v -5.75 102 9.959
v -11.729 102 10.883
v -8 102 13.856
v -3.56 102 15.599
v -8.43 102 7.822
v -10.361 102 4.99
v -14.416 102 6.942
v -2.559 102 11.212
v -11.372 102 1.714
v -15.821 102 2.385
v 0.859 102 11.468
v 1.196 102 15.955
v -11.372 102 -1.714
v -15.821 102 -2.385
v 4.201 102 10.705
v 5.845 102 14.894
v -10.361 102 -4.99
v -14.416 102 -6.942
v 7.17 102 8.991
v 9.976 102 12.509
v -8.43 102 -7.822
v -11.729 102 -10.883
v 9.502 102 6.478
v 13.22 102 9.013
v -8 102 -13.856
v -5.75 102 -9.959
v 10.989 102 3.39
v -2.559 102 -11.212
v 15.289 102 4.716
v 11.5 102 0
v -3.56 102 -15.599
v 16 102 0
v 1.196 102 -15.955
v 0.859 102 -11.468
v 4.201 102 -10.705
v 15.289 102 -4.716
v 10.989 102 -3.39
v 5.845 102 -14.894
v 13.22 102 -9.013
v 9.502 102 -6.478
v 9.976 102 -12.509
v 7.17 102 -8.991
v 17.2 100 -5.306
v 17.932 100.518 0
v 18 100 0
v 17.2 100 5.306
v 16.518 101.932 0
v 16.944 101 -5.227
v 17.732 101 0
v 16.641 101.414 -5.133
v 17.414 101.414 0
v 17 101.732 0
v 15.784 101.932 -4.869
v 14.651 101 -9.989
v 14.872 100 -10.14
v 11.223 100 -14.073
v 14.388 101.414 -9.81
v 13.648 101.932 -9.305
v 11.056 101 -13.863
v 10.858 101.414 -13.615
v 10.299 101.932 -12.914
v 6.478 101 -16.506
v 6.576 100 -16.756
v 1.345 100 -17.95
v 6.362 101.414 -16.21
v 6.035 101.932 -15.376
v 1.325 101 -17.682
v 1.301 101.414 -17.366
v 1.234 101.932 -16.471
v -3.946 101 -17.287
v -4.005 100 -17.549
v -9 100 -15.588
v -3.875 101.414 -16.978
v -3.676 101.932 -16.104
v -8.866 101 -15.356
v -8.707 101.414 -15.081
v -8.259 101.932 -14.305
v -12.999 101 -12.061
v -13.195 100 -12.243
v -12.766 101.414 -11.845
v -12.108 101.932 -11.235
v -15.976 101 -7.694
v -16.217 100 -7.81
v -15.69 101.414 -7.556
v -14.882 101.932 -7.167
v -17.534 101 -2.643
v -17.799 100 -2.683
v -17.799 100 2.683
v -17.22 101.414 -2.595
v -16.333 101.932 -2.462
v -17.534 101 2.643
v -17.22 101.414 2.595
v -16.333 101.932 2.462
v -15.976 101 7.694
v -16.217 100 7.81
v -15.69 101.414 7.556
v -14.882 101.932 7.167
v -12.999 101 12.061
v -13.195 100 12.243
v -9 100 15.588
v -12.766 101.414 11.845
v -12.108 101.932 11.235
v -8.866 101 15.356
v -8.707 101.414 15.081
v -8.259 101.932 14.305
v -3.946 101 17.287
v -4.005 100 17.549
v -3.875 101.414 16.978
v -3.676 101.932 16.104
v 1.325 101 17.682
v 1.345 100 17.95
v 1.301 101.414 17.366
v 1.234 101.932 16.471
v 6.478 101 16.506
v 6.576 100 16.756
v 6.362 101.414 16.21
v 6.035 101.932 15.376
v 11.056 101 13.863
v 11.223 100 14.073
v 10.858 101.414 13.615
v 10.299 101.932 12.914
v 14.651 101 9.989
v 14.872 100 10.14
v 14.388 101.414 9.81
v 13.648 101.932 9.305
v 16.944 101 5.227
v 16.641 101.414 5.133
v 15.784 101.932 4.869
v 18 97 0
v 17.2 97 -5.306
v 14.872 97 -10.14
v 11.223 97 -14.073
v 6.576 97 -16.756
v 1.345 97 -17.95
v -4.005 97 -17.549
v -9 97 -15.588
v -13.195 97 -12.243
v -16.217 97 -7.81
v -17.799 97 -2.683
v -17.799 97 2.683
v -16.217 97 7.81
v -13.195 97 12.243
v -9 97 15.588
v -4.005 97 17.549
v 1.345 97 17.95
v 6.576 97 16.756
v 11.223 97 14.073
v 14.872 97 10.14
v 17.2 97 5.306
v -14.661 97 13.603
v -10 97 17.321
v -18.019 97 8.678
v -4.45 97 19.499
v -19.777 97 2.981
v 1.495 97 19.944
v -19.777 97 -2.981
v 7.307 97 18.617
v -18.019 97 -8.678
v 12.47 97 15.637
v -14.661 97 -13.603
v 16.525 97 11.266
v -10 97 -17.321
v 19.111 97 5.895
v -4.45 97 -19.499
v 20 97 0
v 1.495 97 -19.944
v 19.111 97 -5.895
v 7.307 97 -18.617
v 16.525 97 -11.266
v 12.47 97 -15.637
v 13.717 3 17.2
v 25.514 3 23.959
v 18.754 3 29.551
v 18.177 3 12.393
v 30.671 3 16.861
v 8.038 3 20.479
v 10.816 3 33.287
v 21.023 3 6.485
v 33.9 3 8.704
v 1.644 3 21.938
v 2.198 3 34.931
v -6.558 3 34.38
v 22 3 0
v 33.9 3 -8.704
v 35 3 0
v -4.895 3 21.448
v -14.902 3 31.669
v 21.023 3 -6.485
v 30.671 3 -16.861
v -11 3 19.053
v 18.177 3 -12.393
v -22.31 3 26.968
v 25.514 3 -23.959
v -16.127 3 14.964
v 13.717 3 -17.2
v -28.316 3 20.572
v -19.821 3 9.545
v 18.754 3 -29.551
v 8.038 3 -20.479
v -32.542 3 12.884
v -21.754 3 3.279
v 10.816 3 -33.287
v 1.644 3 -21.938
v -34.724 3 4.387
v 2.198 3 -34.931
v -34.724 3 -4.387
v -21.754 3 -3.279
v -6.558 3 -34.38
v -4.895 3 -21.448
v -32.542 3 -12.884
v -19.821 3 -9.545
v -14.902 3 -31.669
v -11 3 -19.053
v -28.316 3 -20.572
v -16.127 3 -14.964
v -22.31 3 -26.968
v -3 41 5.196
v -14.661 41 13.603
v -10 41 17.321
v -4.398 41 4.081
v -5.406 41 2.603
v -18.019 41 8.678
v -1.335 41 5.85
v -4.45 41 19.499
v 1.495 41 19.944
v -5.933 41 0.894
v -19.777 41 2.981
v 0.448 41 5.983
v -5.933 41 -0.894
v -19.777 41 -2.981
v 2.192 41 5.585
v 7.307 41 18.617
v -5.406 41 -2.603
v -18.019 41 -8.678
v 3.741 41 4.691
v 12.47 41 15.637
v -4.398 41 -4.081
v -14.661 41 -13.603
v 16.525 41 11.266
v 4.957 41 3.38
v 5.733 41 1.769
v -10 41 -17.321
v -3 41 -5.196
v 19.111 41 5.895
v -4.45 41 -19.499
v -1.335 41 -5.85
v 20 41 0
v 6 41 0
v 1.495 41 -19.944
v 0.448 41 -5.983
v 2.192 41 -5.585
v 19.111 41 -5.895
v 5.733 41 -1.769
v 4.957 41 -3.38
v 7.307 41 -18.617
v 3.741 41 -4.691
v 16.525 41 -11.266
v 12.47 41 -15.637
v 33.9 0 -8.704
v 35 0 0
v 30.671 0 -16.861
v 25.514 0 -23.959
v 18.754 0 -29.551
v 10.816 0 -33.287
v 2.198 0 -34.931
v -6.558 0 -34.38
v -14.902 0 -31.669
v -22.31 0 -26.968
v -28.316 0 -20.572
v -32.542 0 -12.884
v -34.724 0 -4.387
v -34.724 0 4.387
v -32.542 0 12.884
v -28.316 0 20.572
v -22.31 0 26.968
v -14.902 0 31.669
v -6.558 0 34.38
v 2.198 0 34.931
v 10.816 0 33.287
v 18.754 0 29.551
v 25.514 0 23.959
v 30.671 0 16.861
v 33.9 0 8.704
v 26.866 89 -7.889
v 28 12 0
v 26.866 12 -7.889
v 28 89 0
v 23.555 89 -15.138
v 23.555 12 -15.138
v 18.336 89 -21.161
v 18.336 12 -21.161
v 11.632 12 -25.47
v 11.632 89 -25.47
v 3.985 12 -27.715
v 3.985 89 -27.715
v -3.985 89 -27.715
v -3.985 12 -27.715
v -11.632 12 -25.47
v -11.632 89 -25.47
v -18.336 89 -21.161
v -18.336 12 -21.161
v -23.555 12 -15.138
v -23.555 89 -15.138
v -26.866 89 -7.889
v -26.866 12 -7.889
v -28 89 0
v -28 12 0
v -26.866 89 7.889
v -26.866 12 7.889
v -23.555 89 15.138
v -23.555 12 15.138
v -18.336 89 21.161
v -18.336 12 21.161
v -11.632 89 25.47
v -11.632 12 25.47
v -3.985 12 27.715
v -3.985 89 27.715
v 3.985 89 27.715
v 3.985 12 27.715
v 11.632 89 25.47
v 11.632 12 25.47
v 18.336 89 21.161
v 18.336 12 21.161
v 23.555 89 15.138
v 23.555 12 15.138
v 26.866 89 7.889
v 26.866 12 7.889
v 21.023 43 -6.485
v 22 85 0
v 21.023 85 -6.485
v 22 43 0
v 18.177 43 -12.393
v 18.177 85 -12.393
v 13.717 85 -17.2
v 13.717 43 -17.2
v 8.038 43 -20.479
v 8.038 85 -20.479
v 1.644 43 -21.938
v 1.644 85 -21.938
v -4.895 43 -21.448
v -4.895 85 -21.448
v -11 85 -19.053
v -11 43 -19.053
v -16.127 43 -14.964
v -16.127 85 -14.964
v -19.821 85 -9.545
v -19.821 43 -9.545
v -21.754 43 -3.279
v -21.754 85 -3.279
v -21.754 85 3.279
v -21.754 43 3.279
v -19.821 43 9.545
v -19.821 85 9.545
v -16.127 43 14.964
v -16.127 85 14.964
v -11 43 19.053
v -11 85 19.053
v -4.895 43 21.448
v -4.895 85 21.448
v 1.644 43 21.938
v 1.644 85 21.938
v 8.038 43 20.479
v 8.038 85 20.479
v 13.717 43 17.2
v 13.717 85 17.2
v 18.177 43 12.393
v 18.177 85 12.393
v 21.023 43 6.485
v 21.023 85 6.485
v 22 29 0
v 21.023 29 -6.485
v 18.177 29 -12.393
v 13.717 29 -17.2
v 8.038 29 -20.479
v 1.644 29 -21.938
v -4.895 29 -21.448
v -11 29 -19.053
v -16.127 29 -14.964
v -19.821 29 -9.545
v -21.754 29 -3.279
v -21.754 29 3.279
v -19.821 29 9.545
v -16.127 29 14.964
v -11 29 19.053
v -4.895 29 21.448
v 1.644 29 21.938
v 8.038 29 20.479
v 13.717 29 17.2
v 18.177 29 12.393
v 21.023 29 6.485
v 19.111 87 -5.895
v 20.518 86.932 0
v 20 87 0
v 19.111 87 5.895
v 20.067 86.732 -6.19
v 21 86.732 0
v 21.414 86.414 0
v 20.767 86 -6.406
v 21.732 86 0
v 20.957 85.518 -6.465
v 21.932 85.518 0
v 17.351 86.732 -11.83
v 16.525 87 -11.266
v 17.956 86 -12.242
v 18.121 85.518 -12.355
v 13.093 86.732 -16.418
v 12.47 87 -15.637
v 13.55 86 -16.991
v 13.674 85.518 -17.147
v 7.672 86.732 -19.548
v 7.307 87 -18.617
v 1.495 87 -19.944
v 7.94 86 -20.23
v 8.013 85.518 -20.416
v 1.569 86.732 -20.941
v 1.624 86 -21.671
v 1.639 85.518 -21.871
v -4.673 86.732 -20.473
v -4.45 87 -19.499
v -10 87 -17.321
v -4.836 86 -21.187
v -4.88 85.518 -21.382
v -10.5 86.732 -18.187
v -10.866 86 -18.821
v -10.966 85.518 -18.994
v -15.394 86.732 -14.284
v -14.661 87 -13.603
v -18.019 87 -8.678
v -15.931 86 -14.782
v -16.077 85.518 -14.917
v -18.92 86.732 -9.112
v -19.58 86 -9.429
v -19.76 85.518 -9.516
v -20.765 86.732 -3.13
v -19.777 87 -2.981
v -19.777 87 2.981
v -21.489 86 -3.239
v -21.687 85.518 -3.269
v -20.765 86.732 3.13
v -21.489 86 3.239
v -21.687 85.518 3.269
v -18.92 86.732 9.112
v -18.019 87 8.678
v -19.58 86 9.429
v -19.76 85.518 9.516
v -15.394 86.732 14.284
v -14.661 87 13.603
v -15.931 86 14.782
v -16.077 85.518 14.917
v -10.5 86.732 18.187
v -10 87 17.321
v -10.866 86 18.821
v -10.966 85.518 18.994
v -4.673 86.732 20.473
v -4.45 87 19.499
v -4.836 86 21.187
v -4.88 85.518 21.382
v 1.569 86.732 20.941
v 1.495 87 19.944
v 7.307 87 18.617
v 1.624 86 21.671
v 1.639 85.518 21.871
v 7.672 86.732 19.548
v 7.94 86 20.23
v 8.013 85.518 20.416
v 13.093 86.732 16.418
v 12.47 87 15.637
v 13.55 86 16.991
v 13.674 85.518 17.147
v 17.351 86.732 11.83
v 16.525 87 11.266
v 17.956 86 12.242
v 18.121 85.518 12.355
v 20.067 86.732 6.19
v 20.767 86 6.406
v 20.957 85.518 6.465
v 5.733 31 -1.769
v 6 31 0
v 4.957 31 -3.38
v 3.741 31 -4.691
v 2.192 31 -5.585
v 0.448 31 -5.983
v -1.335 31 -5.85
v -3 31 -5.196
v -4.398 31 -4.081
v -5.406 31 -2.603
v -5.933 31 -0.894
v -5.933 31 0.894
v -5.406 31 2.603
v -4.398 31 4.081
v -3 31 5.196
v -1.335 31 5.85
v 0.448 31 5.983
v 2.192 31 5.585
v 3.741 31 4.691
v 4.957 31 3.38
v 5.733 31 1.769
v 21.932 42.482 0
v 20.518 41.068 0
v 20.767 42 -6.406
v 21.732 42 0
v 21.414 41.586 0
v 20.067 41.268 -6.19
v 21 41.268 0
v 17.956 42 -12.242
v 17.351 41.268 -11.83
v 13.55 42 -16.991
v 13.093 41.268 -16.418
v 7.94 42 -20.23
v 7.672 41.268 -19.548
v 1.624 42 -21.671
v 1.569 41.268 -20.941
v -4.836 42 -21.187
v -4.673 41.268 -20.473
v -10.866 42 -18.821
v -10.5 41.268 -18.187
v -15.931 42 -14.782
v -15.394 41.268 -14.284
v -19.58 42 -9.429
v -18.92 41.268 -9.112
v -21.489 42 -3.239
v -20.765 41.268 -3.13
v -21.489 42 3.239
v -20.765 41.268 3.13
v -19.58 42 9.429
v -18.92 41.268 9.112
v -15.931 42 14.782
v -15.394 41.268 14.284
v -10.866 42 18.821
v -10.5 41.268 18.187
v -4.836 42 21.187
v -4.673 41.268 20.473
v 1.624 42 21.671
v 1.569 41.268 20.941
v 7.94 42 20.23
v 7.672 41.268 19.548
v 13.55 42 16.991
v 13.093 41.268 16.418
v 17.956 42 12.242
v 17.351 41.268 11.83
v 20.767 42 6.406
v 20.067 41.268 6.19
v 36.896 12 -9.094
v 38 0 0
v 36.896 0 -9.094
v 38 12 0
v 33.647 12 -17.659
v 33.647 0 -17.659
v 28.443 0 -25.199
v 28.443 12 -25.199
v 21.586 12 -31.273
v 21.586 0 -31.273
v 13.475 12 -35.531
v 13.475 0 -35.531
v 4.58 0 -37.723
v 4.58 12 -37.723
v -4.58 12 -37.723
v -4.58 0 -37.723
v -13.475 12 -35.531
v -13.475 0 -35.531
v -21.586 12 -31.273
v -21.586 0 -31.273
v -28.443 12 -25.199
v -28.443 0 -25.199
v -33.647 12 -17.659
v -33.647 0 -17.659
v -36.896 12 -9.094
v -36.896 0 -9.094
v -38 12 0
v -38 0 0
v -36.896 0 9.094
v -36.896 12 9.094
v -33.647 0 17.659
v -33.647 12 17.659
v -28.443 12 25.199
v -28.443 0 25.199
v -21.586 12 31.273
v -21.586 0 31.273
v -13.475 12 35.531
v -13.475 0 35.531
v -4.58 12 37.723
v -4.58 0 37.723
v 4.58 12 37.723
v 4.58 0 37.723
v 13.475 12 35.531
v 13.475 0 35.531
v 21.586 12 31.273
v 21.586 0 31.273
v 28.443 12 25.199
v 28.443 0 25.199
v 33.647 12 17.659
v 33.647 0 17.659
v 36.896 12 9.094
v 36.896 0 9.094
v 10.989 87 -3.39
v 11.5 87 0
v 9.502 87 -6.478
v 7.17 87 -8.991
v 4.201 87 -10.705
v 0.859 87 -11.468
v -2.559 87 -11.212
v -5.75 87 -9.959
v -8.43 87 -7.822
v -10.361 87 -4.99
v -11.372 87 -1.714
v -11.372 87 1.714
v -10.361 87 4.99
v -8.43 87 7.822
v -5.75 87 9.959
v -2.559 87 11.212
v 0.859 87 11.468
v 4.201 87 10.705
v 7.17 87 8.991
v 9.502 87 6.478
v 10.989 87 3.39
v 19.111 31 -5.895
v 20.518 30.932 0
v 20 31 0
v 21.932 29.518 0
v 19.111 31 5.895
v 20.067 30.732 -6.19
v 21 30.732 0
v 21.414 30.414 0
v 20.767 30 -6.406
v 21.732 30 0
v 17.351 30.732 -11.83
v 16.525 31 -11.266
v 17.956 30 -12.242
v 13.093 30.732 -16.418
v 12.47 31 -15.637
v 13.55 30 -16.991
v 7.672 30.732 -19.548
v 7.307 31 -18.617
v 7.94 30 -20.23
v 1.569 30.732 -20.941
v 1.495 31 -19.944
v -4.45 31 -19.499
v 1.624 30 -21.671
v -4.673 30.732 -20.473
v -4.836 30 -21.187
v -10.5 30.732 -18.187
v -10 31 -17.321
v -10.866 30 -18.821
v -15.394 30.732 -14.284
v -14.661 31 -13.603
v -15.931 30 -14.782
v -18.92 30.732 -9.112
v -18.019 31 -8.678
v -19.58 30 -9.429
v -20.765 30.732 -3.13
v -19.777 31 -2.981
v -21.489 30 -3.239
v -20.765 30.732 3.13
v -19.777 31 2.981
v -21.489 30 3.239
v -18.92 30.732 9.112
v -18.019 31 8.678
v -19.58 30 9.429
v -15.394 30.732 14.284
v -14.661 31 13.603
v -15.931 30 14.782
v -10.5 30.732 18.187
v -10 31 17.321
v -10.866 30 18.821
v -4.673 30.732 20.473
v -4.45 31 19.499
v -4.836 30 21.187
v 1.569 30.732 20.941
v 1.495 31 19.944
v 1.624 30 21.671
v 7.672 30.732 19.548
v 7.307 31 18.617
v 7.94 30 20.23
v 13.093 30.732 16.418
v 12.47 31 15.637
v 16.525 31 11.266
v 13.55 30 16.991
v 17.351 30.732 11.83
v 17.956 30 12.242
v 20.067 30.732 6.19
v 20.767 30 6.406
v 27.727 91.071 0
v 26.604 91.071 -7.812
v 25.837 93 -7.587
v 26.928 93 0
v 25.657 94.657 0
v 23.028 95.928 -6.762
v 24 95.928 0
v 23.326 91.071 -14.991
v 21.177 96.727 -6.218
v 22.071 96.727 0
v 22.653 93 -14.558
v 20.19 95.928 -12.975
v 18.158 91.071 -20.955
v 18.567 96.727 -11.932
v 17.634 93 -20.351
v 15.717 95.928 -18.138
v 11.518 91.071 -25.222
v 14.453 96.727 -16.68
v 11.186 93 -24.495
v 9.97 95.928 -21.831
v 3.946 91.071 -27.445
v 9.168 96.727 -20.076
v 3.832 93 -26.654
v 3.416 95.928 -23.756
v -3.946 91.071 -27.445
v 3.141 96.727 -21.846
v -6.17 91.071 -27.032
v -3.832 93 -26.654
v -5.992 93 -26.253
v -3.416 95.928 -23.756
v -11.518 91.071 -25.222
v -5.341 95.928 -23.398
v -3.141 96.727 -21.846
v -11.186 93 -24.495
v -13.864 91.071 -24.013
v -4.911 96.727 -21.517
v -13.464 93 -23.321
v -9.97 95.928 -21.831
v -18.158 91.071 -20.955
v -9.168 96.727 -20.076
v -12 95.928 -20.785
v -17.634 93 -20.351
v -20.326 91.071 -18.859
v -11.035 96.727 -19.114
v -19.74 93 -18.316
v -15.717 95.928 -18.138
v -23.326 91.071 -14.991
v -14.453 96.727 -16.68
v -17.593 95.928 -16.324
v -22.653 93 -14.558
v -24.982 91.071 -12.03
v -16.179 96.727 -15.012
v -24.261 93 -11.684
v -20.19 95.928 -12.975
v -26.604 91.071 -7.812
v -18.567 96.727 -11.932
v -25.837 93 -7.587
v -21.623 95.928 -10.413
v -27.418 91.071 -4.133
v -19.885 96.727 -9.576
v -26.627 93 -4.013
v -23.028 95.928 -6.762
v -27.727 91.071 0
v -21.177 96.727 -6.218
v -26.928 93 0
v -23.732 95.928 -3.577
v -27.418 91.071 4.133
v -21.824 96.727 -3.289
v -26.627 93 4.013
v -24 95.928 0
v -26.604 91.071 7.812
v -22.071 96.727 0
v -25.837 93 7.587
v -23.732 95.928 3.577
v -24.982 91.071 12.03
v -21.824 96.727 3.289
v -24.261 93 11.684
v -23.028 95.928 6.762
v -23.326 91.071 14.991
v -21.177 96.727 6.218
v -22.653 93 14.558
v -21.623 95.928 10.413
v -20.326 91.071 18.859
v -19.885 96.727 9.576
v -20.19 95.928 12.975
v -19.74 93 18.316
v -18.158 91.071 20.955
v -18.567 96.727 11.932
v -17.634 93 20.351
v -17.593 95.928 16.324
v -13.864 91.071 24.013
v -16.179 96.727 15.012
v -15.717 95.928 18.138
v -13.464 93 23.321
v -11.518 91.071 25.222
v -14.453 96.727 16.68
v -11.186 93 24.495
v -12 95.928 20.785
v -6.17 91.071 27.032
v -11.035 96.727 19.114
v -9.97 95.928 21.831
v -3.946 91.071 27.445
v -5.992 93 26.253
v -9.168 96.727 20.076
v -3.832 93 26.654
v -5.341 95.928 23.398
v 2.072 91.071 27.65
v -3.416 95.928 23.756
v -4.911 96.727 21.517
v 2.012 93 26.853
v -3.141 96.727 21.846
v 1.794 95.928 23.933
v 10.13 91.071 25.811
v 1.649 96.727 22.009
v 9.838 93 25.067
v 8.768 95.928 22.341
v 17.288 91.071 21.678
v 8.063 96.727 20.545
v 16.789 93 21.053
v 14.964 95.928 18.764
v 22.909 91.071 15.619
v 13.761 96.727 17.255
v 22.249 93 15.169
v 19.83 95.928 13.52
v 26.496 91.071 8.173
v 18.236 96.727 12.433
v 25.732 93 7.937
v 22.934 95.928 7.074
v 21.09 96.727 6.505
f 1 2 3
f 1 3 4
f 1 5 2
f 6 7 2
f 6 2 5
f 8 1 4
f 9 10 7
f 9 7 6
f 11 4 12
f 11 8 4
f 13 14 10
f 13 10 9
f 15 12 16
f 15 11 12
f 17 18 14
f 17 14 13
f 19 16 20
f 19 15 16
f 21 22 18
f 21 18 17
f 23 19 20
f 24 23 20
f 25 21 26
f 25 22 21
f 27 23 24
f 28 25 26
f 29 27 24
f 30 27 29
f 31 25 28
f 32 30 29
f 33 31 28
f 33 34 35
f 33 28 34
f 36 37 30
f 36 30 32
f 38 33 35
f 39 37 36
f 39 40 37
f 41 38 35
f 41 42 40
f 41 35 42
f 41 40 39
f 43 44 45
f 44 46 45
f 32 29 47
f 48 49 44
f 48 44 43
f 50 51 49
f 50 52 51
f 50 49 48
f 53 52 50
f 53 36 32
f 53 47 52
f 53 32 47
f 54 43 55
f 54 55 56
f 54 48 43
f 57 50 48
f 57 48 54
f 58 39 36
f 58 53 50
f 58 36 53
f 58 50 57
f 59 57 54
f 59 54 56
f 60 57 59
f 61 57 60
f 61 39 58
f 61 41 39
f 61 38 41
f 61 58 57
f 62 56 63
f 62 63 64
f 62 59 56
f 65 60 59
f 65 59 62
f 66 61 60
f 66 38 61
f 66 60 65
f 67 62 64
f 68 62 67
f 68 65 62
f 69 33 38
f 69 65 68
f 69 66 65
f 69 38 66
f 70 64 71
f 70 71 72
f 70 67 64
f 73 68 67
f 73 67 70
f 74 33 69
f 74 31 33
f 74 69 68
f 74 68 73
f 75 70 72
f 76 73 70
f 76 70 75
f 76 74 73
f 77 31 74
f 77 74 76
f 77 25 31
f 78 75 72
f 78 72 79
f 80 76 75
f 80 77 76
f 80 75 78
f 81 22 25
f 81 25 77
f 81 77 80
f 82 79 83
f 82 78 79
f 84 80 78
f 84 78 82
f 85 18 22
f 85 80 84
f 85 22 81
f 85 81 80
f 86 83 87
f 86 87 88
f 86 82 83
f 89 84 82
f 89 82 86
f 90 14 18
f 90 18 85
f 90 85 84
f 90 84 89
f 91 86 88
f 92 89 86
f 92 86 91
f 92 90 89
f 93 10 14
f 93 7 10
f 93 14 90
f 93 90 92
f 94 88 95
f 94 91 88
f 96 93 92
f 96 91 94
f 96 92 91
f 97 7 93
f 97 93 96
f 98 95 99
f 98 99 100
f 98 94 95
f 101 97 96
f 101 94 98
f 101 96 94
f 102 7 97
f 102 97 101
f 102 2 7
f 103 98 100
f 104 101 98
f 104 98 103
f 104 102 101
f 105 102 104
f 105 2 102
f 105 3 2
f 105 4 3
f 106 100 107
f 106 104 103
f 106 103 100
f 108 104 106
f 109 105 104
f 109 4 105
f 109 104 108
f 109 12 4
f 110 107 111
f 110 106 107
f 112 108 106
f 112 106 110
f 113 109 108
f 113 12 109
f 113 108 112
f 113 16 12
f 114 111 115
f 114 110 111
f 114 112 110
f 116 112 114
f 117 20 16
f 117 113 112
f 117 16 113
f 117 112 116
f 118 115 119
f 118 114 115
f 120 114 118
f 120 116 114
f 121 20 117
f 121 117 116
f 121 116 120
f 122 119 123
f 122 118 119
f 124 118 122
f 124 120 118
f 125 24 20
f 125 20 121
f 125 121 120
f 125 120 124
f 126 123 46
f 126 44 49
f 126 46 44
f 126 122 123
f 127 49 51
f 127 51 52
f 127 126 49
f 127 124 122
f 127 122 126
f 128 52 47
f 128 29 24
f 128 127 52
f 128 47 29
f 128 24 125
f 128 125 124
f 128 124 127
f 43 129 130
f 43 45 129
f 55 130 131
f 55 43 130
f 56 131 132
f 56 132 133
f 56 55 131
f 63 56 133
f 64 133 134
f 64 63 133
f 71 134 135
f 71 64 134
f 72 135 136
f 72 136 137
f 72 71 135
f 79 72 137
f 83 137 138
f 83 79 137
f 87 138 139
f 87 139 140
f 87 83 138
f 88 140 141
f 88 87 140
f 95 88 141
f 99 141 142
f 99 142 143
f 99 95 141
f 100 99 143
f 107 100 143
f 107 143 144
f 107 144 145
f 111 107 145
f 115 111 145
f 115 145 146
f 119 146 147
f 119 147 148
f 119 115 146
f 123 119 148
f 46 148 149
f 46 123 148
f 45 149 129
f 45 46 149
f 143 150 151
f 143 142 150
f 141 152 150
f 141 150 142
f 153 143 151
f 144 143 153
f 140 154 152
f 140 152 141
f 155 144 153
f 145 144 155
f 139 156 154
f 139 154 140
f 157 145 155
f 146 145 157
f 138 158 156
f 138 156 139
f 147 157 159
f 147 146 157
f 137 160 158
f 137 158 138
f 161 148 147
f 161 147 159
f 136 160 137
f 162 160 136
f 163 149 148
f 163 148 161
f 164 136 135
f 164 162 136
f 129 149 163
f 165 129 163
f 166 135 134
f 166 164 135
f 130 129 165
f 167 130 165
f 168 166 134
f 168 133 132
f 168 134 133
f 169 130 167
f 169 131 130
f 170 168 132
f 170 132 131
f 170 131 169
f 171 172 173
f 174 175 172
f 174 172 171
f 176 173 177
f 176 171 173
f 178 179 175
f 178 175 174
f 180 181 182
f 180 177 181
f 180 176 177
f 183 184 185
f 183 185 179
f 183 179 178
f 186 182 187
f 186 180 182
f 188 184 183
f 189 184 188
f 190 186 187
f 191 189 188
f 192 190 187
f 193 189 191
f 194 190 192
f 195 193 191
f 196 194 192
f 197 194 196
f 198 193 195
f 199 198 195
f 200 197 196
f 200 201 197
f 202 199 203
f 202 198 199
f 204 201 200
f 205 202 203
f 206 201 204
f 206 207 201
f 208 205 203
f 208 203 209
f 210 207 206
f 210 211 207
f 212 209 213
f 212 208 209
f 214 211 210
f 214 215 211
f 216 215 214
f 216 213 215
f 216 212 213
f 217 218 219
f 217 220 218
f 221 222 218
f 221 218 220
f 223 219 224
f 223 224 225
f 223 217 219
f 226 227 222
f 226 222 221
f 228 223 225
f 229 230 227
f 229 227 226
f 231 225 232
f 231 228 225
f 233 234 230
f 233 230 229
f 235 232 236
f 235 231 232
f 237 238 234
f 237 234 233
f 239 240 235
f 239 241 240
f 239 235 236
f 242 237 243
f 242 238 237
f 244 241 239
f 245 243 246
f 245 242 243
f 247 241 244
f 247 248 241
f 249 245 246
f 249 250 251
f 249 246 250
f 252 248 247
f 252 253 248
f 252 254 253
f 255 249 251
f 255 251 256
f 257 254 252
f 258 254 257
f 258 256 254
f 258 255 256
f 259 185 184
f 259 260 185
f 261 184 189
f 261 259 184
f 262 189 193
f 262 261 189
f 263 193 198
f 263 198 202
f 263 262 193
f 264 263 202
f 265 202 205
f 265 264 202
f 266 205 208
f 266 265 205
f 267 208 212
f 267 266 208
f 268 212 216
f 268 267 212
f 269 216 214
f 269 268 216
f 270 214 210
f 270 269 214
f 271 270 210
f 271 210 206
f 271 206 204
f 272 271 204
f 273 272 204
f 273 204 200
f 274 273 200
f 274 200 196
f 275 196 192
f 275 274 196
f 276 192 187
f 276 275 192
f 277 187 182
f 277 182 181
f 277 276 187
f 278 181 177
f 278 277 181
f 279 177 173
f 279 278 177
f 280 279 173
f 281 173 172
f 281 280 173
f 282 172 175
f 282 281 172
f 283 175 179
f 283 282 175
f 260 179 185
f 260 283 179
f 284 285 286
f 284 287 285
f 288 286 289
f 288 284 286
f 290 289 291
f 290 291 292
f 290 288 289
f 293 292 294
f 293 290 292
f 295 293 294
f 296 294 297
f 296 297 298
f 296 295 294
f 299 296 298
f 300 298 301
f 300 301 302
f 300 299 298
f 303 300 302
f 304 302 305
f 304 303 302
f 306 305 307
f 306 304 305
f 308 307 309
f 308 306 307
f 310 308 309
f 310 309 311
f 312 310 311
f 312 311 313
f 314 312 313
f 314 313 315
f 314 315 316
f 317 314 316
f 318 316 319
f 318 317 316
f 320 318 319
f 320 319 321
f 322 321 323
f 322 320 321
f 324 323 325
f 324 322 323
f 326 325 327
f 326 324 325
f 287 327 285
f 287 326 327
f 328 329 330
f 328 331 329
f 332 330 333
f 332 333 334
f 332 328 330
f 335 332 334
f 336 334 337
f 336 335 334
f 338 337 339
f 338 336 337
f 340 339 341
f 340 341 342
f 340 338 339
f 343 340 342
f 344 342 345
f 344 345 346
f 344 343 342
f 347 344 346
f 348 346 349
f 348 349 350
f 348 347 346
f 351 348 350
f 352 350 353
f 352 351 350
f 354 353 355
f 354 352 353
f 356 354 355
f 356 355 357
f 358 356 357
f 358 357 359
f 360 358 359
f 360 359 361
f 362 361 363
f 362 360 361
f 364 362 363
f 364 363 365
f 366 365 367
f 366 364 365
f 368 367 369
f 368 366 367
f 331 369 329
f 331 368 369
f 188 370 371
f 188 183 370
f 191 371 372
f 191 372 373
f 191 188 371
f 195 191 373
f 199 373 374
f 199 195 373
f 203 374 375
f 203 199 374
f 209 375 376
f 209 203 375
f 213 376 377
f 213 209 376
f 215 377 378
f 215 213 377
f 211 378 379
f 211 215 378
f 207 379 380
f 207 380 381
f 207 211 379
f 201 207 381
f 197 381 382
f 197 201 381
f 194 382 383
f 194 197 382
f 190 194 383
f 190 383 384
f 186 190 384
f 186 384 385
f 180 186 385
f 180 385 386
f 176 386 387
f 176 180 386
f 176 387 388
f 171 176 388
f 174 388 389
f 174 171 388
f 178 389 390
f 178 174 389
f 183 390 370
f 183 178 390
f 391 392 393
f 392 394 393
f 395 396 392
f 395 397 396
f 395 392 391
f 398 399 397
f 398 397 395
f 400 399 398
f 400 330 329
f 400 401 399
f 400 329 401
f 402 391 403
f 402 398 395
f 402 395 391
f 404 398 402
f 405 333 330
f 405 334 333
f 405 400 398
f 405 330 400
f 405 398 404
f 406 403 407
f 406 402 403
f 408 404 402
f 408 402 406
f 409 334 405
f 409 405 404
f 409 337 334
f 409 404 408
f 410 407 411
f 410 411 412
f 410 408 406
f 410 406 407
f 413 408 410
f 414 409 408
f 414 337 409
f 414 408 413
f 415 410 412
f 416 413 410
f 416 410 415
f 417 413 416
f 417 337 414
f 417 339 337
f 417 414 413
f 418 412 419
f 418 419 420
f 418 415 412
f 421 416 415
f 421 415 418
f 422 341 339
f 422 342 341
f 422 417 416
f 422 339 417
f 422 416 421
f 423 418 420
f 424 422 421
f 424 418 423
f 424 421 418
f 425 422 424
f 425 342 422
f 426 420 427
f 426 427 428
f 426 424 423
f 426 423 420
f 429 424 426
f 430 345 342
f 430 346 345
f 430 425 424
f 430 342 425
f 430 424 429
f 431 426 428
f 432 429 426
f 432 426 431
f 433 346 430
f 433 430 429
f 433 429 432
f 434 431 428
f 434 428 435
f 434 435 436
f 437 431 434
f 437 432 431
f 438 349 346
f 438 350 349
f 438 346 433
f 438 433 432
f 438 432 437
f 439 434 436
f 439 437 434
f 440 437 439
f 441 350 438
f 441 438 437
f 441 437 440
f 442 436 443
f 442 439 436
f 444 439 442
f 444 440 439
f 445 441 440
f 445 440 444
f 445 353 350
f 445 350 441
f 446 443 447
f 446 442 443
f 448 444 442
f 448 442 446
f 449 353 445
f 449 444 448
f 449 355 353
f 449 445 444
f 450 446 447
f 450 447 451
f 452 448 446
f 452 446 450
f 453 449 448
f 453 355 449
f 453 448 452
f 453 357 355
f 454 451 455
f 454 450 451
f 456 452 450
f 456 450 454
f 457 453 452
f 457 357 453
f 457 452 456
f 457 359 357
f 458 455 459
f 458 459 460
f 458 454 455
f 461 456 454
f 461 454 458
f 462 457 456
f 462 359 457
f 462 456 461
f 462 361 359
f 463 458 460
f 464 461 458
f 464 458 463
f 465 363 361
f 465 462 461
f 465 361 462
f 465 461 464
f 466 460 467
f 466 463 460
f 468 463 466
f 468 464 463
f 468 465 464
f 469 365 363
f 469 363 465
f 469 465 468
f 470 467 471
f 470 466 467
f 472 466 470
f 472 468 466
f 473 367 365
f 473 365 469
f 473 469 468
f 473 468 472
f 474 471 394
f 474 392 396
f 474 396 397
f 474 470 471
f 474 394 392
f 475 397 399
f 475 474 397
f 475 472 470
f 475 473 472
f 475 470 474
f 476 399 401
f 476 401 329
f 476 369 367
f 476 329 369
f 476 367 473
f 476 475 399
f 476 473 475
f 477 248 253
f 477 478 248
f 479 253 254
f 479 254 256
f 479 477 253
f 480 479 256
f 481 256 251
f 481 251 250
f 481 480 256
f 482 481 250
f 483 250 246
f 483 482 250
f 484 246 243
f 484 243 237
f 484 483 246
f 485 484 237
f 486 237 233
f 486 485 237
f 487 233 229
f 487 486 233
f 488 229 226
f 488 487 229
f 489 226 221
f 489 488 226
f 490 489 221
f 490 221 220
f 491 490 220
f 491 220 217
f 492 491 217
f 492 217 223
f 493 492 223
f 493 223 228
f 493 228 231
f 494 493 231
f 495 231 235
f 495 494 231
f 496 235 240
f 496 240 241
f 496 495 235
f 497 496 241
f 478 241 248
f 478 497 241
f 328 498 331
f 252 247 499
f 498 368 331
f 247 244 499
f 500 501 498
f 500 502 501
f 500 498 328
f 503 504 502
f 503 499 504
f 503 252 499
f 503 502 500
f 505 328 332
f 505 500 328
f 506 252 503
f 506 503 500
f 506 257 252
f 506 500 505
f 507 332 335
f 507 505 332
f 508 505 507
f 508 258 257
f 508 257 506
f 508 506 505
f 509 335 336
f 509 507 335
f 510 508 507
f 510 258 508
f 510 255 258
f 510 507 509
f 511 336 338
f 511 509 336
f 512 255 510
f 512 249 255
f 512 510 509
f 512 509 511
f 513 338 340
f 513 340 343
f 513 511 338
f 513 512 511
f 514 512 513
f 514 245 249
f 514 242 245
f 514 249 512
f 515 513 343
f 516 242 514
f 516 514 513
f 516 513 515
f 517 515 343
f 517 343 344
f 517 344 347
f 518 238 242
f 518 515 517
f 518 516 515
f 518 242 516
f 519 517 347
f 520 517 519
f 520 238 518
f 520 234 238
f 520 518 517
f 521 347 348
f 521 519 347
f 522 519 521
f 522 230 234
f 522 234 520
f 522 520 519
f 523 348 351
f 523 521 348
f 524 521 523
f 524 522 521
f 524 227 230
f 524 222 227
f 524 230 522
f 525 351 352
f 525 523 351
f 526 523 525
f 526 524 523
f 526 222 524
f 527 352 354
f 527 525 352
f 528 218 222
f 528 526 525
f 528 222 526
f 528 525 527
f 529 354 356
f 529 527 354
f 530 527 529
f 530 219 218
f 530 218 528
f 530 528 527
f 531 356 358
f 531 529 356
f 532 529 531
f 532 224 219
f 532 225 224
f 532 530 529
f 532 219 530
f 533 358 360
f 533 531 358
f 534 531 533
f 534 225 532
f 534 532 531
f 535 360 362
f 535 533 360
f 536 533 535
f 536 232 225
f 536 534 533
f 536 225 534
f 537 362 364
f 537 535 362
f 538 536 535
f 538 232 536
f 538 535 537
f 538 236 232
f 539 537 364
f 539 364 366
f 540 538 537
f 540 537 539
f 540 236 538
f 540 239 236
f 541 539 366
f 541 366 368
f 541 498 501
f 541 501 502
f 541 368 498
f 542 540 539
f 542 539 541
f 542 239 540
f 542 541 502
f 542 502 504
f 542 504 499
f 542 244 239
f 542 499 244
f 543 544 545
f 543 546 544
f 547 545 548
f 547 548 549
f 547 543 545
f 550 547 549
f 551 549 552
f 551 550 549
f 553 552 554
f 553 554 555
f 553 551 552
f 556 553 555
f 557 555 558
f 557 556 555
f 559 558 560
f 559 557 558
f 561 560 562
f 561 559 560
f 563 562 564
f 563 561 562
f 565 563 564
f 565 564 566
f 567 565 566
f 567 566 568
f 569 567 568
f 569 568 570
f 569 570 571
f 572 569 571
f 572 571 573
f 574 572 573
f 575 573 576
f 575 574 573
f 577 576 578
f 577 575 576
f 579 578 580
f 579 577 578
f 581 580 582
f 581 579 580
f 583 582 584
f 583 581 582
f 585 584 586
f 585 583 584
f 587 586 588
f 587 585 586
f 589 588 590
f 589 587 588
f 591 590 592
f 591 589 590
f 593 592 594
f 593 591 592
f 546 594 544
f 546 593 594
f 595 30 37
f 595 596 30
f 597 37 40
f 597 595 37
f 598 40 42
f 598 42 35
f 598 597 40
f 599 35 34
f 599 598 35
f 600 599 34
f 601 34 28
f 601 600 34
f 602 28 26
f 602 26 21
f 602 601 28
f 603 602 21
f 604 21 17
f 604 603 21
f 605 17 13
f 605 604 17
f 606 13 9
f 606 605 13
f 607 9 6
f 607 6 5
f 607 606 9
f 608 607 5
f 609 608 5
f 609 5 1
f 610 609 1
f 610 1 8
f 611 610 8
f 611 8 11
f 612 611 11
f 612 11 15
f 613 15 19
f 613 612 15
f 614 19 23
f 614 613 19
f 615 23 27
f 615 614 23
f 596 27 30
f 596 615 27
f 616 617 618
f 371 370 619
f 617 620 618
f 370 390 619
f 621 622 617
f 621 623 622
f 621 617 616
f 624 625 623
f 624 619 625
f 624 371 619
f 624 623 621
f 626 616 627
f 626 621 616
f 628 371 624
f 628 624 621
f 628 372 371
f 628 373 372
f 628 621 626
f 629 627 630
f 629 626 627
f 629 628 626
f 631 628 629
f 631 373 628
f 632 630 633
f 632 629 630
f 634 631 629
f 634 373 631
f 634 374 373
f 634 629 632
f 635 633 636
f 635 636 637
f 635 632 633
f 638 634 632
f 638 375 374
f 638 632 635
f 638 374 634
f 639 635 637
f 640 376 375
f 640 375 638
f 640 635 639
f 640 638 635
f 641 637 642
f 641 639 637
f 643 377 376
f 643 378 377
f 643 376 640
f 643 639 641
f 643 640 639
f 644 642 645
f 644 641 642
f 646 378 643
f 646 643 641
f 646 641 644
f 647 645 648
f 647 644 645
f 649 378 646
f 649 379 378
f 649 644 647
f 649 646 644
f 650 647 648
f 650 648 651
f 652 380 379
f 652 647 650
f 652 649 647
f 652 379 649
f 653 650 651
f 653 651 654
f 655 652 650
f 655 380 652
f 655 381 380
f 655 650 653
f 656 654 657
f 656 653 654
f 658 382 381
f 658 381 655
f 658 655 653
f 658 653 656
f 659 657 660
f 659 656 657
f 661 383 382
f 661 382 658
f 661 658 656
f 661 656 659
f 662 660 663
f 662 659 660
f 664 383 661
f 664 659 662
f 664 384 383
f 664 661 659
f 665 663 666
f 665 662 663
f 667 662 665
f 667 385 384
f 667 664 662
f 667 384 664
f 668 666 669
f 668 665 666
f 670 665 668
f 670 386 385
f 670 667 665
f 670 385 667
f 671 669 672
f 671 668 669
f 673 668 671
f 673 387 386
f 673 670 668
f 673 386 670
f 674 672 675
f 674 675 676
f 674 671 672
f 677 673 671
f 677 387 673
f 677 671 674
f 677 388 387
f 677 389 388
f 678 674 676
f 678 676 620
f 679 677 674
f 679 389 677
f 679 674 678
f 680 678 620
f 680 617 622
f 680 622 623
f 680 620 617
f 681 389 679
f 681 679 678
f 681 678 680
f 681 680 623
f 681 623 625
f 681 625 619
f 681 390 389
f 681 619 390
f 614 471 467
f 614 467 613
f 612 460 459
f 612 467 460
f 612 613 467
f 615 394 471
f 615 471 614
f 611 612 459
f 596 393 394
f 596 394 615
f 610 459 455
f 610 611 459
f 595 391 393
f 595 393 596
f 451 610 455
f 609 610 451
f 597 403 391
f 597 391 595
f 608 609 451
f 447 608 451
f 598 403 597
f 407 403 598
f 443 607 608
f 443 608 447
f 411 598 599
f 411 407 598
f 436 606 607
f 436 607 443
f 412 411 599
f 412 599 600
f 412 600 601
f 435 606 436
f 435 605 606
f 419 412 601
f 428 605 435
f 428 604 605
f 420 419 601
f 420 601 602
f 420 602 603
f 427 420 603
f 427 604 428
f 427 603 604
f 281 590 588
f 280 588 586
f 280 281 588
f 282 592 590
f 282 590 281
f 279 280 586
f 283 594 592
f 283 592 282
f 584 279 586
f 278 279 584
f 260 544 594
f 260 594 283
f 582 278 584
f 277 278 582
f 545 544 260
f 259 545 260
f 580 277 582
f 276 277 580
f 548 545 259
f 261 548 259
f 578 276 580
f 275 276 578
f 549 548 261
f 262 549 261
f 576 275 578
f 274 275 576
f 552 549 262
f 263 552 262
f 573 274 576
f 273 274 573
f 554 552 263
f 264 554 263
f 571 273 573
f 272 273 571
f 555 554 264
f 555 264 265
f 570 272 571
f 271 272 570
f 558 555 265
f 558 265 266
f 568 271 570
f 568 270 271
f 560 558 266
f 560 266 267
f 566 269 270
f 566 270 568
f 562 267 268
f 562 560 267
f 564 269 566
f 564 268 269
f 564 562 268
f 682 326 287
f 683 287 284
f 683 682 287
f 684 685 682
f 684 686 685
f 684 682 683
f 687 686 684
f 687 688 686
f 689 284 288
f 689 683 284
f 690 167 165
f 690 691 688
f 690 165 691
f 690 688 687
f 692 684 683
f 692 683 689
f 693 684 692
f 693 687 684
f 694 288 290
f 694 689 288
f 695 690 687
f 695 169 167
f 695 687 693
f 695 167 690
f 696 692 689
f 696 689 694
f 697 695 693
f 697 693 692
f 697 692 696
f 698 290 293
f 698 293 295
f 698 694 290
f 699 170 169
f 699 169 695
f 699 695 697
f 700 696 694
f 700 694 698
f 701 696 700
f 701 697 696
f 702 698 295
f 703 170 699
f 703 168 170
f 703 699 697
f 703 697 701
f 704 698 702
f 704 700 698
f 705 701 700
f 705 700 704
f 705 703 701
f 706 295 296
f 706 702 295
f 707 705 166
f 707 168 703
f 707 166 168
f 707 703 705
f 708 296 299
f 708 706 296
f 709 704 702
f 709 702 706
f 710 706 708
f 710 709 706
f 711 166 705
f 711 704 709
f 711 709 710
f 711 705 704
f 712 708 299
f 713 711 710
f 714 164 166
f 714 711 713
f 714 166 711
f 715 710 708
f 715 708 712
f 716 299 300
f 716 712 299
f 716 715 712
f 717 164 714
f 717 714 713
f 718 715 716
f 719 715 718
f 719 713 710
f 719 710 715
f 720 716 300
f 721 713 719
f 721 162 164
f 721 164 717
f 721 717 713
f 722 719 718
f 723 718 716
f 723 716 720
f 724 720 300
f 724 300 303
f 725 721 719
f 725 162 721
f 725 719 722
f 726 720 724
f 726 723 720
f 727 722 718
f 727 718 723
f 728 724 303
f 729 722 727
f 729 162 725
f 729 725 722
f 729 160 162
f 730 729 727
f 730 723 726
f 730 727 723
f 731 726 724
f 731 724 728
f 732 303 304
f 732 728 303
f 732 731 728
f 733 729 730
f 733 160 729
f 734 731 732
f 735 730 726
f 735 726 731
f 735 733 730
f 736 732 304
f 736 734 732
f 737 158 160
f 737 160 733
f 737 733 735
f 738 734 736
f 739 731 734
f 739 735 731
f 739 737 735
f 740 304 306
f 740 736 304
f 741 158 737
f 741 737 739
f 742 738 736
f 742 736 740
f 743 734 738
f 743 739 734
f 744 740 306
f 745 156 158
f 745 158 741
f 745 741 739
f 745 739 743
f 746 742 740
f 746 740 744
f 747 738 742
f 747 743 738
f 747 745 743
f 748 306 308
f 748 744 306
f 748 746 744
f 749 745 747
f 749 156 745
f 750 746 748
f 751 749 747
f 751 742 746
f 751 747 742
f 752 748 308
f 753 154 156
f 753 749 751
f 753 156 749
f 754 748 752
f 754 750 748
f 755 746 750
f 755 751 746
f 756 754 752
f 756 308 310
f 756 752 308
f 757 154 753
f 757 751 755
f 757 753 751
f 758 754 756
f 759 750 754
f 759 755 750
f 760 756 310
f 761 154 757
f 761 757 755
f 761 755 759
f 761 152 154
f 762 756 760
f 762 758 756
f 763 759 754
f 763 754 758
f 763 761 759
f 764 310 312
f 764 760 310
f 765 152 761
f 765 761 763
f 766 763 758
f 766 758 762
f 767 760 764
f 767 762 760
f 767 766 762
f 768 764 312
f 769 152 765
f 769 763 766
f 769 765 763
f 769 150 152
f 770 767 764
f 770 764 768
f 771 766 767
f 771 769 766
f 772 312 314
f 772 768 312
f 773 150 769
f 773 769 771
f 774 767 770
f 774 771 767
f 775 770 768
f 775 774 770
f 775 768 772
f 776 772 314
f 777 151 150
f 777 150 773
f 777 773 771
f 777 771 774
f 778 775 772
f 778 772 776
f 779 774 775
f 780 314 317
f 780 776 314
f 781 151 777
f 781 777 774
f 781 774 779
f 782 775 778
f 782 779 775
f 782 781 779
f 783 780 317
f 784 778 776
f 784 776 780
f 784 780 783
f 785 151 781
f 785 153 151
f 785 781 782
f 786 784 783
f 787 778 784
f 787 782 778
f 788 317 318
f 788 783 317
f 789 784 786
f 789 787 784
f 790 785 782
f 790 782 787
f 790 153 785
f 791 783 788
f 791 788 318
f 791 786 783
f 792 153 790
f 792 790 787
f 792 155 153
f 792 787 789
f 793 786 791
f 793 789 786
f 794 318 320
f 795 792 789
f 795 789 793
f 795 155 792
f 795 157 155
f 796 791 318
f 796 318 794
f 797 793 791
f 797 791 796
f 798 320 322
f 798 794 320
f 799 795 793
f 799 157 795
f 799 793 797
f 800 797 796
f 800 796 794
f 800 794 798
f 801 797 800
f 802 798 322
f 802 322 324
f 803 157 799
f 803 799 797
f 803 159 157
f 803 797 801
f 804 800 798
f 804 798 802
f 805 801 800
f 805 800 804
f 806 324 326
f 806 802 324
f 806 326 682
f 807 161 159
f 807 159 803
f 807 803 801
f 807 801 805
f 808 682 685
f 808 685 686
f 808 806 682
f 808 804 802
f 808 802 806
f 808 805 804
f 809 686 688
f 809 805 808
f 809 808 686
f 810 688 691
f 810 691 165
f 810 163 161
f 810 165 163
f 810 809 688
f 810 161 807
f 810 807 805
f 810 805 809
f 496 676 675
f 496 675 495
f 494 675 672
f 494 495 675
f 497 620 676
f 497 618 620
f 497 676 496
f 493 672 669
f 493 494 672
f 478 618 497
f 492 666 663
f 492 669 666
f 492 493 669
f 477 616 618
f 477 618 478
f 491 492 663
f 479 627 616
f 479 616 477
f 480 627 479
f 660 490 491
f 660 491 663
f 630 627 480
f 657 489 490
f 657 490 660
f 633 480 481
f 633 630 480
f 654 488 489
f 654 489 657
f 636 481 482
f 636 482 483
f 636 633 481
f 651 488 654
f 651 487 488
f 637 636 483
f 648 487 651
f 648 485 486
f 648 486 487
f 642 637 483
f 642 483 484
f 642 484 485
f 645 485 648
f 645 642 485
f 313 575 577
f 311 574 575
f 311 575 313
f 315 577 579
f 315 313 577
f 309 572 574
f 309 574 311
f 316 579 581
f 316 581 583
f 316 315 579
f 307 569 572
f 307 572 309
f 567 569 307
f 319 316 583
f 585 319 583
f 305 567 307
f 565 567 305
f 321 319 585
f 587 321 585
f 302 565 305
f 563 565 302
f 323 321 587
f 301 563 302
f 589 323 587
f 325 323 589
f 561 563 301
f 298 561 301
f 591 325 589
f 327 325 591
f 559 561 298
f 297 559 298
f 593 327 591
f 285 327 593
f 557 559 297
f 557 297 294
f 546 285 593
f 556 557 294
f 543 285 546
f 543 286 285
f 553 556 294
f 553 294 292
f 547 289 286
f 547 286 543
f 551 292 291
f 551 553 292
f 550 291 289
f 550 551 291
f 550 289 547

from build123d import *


with BuildPart() as part:
    # Çizim1 → Döndür1 (revolve)
    with BuildSketch(Plane.XY):
        with BuildLine():
            Line((38, 0), (38, 12))
            Line((38, 12), (28, 12))
            Line((28, 12), (28, 89))
            ThreePointArc((28, 89), (25.656854249, 94.656854249), (20, 97))
            Line((20, 97), (18, 97))
            Line((18, 97), (18, 100))
            ThreePointArc((18, 100), (17.414213562, 101.414213562), (16, 102))
            Line((16, 102), (11.5, 102))
            Line((11.5, 102), (11.5, 87))
            Line((11.5, 87), (20, 87))
            ThreePointArc((20, 87), (21.414213562, 86.414213562), (22, 85))
            Line((22, 85), (22, 43))
            ThreePointArc((22, 43), (21.414213562, 41.585786438), (20, 41))
            Line((20, 41), (6, 41))
            Line((6, 41), (6, 31))
            Line((6, 31), (20, 31))
            ThreePointArc((20, 31), (21.414213562, 30.414213562), (22, 29))
            Line((22, 29), (22, 3))
            Line((22, 3), (35, 3))
            Line((35, 3), (35, 0))
            Line((35, 0), (38, 0))
        make_face()
    revolve(axis=Axis((0, 0, 0), (0, 1, 0)))


solid = part.part
